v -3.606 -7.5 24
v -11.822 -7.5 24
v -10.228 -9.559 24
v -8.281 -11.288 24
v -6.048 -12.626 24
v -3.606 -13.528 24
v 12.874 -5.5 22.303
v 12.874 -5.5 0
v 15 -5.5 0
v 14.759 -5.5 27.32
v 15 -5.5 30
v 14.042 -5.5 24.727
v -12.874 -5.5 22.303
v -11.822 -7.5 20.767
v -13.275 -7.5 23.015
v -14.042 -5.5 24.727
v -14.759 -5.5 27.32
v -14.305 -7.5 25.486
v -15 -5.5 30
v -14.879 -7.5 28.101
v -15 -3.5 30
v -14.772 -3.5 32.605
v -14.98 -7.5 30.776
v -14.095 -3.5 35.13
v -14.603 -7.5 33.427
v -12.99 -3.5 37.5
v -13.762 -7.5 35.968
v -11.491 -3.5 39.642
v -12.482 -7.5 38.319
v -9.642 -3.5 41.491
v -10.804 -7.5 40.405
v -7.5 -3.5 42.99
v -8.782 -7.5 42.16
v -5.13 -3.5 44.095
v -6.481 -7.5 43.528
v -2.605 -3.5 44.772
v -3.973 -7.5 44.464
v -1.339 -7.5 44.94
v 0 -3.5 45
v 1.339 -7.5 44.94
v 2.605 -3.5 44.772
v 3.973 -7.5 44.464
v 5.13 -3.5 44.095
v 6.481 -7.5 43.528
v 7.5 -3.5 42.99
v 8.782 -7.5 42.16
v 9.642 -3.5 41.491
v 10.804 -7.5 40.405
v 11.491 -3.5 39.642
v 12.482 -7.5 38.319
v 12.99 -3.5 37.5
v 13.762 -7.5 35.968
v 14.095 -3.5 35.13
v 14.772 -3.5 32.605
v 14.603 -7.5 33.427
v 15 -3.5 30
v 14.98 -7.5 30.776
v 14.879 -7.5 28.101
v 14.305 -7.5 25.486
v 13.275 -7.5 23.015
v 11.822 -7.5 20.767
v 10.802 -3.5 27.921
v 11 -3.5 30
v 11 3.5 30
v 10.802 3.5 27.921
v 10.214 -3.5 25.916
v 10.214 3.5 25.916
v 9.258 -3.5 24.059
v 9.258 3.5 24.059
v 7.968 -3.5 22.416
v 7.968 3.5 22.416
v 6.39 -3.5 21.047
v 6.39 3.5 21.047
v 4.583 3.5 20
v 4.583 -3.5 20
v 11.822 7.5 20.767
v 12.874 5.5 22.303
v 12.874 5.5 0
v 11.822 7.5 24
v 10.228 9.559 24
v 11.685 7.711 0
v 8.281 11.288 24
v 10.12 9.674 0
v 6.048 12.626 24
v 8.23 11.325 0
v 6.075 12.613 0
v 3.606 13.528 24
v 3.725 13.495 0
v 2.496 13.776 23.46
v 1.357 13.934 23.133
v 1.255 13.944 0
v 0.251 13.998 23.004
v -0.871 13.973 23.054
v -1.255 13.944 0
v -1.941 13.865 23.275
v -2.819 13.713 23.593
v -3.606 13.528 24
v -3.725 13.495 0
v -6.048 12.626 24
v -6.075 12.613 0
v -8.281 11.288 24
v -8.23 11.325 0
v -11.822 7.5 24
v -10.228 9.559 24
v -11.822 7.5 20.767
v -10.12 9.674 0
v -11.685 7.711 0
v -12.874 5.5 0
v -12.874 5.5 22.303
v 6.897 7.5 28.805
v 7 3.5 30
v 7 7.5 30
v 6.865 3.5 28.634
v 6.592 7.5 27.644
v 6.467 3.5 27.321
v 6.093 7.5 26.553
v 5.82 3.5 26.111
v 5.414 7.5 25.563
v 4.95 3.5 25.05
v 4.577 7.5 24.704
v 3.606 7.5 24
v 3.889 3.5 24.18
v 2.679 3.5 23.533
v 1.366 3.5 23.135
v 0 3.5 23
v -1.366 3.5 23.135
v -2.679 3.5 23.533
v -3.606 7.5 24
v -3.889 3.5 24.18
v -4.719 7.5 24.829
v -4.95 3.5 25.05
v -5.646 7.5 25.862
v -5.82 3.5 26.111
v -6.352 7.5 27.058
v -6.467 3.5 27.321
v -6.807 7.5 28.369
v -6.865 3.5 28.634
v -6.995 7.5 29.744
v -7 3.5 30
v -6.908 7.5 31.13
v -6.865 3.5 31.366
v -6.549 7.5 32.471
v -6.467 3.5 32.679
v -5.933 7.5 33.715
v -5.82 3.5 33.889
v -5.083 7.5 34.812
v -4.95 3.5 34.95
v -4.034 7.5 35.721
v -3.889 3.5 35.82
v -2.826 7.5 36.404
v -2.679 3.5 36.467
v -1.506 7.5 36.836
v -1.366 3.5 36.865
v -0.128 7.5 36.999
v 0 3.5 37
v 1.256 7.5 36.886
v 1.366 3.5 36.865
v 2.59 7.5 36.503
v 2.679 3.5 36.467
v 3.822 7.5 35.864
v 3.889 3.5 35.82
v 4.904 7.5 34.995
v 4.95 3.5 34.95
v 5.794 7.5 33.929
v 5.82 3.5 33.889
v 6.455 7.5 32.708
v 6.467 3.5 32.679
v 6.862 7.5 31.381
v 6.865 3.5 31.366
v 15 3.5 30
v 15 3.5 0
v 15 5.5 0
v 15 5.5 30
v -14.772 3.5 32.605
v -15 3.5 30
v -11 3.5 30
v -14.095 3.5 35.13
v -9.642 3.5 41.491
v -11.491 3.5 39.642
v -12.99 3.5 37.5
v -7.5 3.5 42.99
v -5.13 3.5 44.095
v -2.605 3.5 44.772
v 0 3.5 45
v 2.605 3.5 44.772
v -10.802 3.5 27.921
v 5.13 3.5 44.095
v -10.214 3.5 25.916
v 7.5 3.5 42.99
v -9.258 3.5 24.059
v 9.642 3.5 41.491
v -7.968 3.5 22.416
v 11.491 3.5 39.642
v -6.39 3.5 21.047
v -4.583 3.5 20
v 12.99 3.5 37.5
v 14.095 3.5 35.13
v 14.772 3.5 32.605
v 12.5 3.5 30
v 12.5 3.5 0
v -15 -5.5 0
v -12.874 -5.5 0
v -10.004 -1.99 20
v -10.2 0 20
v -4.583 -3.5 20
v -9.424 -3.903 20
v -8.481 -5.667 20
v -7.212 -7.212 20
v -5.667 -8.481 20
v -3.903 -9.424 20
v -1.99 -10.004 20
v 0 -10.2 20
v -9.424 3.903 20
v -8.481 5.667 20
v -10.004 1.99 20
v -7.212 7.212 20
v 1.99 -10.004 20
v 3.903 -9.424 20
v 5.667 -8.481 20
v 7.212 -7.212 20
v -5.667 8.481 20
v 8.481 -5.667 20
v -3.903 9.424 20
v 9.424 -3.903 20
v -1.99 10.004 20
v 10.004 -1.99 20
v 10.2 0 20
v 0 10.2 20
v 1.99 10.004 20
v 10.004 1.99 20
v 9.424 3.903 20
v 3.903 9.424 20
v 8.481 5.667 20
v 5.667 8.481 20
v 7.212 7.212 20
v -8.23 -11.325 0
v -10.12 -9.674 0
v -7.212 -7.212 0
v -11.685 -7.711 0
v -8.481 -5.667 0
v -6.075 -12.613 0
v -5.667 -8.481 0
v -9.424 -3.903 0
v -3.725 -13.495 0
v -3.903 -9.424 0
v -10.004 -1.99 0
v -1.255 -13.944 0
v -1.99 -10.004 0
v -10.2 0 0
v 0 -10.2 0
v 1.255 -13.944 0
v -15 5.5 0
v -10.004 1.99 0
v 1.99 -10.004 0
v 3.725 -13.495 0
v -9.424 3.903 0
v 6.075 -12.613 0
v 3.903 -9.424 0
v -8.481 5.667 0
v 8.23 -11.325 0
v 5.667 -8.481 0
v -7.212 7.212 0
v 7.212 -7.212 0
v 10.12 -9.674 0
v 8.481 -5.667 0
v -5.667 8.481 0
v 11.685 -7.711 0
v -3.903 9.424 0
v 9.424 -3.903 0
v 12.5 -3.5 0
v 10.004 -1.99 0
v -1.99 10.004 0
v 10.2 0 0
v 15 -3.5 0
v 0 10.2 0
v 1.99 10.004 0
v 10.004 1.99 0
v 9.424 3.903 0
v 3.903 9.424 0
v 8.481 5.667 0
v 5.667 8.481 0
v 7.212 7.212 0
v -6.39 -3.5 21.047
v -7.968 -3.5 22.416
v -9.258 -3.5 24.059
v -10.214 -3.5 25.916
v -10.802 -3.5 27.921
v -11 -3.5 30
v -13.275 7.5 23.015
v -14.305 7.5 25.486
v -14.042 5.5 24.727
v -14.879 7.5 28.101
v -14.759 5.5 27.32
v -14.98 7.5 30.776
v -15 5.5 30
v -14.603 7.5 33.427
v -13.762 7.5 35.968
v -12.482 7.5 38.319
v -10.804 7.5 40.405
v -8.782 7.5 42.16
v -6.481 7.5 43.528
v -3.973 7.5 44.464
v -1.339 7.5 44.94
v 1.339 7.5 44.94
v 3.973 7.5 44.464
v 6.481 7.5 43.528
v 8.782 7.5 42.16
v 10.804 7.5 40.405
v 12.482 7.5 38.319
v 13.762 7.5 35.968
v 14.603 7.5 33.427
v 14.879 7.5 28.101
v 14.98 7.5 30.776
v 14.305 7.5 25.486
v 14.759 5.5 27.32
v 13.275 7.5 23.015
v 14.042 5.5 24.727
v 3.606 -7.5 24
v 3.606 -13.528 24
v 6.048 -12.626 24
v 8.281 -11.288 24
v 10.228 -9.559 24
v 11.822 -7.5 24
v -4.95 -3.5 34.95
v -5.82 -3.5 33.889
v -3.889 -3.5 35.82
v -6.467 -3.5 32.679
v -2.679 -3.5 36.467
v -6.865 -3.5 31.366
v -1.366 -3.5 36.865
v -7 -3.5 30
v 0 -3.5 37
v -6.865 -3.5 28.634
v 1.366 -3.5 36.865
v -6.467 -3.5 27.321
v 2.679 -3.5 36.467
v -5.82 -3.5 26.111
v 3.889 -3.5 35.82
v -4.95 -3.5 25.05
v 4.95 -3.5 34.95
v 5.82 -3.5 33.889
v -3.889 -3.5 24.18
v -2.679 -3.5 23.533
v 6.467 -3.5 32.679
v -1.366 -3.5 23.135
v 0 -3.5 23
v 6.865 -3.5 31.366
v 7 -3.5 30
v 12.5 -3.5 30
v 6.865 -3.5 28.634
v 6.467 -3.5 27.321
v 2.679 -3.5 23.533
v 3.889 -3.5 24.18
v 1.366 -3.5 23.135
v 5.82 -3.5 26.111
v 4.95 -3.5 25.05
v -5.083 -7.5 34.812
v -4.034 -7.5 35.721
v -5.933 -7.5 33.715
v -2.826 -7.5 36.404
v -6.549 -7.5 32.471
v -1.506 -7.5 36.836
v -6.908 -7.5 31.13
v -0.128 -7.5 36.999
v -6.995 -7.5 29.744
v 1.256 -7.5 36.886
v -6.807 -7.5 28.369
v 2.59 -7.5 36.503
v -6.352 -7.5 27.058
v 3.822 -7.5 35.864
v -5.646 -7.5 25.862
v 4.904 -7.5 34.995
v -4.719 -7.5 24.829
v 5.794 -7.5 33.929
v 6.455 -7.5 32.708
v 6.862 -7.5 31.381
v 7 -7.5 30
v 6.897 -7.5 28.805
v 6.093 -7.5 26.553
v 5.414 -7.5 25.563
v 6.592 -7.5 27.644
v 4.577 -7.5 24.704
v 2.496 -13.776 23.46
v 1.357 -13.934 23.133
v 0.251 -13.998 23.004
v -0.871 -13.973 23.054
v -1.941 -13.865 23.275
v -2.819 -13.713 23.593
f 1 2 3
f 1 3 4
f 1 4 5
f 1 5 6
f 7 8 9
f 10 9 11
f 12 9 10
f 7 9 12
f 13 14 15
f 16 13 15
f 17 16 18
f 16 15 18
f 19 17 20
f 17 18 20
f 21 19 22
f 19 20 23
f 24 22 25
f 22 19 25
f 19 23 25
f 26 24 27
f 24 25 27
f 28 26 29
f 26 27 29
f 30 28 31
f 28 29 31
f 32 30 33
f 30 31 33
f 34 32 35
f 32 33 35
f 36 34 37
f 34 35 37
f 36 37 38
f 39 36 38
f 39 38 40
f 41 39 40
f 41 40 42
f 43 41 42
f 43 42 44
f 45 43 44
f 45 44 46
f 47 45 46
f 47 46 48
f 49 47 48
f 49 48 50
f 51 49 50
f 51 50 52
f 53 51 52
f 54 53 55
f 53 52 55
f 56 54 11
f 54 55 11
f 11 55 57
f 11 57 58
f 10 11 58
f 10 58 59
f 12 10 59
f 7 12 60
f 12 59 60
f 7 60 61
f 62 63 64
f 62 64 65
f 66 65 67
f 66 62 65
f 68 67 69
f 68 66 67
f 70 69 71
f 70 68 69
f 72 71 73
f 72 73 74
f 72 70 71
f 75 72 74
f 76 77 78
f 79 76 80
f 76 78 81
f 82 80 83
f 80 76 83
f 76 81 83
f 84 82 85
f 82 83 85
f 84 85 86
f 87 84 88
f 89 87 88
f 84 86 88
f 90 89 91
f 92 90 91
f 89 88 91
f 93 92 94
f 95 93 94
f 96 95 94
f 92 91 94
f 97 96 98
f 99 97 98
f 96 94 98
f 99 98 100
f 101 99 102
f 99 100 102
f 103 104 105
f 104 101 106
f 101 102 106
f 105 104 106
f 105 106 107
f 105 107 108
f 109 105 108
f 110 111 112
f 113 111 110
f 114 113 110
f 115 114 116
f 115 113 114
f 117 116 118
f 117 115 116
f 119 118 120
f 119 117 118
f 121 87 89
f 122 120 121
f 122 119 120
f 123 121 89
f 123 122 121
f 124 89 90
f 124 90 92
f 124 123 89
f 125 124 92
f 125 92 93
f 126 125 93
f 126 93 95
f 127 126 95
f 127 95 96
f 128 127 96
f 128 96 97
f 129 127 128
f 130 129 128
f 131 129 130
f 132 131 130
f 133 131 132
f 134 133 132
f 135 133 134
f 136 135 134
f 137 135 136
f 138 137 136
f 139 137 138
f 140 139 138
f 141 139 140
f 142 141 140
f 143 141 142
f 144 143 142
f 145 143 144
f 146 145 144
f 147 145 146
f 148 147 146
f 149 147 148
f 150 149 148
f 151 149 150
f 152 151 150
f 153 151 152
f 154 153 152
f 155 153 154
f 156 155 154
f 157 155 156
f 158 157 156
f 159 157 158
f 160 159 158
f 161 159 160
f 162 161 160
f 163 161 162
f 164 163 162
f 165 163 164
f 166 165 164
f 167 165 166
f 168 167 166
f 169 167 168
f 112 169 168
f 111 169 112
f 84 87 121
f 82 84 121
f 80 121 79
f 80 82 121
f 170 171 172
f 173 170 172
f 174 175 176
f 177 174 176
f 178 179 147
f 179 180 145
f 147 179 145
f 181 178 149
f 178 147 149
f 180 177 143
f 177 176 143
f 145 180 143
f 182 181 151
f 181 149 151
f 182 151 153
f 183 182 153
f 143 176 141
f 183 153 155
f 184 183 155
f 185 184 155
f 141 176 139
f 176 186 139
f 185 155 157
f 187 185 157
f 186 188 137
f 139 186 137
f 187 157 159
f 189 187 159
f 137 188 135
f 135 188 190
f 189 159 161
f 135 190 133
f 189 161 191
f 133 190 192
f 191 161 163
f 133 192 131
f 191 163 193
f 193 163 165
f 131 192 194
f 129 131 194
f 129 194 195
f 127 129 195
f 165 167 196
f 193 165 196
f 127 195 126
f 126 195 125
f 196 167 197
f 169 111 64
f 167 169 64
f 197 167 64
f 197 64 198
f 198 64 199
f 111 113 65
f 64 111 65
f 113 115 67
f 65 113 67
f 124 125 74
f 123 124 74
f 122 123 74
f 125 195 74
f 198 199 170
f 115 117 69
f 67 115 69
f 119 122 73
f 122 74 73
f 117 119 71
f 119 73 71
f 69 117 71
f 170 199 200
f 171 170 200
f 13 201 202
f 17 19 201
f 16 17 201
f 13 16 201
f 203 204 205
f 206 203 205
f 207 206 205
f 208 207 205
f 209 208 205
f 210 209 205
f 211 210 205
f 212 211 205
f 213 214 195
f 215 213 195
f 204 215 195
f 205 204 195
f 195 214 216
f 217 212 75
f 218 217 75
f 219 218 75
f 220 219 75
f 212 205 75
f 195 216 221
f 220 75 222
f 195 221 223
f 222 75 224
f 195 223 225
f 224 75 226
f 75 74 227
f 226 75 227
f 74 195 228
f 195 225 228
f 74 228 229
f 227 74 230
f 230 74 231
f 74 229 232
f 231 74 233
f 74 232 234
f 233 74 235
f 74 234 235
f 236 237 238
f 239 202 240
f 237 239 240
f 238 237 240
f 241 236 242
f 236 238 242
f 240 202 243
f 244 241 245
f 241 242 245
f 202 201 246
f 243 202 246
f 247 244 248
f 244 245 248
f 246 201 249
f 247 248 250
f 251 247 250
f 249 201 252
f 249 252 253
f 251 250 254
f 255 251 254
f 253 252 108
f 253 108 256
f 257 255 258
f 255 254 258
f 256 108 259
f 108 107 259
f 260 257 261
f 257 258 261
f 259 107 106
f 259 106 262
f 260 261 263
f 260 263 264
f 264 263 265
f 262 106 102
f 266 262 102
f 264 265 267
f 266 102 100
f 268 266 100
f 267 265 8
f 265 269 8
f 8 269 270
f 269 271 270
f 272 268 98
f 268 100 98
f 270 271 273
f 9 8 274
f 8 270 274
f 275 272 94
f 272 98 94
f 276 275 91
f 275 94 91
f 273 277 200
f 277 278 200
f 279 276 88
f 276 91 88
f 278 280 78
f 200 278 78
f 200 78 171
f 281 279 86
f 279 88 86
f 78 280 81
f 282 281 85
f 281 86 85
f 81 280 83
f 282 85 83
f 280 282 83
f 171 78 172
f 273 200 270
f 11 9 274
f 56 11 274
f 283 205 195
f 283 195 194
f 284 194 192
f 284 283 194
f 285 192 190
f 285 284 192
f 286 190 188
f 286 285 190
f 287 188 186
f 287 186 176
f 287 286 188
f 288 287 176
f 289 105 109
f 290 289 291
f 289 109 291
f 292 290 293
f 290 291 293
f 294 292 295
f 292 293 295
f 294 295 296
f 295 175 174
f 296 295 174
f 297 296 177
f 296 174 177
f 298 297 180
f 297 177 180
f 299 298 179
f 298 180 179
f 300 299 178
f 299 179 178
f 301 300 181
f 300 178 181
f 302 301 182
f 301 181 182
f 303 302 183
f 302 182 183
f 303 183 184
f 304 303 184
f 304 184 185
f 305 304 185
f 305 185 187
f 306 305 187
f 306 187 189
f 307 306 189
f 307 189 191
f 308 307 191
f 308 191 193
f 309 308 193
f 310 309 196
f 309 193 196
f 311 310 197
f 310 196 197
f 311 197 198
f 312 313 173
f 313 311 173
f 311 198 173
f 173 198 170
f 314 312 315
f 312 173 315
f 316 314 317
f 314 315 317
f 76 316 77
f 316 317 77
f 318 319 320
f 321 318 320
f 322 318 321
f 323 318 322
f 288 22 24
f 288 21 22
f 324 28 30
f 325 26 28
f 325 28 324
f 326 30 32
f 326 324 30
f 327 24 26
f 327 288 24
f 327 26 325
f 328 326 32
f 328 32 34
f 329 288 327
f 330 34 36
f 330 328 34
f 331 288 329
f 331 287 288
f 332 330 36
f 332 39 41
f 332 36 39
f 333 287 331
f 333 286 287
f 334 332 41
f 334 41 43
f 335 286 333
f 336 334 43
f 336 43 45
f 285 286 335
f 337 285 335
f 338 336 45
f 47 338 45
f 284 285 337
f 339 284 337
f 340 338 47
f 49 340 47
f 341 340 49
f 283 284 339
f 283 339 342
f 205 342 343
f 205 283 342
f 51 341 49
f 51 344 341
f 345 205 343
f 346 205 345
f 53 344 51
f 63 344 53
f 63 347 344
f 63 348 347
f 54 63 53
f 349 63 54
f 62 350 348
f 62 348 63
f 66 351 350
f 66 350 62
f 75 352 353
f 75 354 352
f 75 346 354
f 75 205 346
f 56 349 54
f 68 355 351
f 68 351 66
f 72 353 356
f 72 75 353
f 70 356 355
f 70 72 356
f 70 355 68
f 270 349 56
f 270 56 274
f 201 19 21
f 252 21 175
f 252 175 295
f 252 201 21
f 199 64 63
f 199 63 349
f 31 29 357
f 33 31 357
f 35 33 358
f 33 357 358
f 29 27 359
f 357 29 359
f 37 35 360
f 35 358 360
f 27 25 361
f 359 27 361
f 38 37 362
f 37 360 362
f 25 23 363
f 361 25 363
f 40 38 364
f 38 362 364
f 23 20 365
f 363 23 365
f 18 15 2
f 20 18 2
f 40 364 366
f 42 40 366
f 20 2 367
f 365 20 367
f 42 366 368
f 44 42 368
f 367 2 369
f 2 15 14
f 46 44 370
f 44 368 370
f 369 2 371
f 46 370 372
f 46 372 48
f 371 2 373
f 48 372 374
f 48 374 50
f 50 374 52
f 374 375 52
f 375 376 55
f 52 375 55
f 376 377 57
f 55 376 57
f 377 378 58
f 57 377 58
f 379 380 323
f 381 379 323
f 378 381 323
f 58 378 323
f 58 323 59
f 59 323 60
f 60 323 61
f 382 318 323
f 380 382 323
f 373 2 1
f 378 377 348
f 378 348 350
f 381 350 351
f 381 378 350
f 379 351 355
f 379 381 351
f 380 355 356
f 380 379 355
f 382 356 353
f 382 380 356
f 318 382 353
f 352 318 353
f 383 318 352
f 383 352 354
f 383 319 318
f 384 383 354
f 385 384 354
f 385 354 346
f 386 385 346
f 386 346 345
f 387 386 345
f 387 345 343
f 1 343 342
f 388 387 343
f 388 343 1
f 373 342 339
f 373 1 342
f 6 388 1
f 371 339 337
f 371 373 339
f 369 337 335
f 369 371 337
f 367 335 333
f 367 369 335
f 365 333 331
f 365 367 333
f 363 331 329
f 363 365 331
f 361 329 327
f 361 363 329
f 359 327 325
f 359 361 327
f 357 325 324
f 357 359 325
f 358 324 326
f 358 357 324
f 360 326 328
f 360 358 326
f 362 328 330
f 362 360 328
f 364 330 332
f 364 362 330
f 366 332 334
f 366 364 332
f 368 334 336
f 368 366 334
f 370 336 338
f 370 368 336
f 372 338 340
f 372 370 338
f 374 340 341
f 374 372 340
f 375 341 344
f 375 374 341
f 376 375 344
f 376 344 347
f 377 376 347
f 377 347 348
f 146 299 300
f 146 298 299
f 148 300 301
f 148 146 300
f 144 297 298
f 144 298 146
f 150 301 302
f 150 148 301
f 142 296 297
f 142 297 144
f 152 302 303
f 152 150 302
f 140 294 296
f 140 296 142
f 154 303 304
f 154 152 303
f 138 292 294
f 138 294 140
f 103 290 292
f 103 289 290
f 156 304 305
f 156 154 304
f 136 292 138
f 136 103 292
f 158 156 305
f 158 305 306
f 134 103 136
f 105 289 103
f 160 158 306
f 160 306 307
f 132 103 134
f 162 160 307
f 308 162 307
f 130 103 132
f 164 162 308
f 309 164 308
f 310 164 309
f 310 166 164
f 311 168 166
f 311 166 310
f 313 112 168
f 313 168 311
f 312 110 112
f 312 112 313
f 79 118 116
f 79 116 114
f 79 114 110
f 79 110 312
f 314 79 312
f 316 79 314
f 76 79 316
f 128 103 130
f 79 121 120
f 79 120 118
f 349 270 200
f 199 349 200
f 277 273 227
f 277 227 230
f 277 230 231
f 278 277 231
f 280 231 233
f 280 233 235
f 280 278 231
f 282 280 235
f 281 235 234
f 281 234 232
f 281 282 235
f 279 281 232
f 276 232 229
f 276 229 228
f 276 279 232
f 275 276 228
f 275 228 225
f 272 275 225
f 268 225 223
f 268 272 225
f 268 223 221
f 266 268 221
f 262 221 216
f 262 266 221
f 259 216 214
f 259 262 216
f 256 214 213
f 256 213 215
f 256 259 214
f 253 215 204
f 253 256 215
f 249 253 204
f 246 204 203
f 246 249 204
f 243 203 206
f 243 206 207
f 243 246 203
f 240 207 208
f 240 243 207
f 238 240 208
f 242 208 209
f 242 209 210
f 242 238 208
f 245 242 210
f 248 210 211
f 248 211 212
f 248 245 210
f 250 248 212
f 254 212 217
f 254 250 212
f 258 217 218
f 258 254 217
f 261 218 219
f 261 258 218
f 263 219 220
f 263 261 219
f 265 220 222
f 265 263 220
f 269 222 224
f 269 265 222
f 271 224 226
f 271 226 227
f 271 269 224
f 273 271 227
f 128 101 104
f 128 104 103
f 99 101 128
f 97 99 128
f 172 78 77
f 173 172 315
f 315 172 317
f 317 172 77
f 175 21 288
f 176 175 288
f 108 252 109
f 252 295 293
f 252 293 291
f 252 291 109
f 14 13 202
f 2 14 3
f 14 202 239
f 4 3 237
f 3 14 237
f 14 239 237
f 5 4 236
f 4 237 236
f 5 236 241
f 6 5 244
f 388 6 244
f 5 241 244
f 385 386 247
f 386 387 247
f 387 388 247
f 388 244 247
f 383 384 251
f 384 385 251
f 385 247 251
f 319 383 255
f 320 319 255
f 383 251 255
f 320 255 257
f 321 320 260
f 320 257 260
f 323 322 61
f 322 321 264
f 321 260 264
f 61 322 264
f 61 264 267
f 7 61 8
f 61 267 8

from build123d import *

# Parameters (mm, degrees)
CYLINDER002_R          = 11
CYLINDER002_DEPTH      = 7
CYLINDER002_ROLL_ANGLE = -90
BOX_W                  = 30
BOX_H                  = 7
BOX_DEPTH              = 15
BOX001_W               = 10
BOX001_H               = 7
BOX001_DEPTH           = 30
CYLINDER005_R          = 10.2
CYLINDER005_DEPTH      = 20
CYLINDER004_R          = 7
CYLINDER004_DEPTH      = 30
CYLINDER004_ROLL_ANGLE = -90
CYLINDER001_R          = 15
CYLINDER001_DEPTH      = 15
CYLINDER001_ROLL_ANGLE = -90
BOX002_W               = 30
BOX002_H               = 11
BOX002_DEPTH           = 30
CYLINDER_R             = 14
CYLINDER_DEPTH         = 24


with BuildPart() as cylinder002:
    # Cylinder002 → Cylinder002 (new body)
    with BuildSketch(Plane.XY):
        Circle(CYLINDER002_R)
    extrude(amount=CYLINDER002_DEPTH)


with BuildPart() as cylinder002_1:
    # Cylinder002 roll: moved
    add(cylinder002.part.rotate(Axis((0, 0, 0), (1, 0, 0)), CYLINDER002_ROLL_ANGLE))


with BuildPart() as cylinder002_2:
    # Cylinder002 placement: moved
    add(cylinder002_1.part.moved(Location((0, -3.5, 30))))


with BuildPart() as cube:
    # Box → Box (new body)
    with BuildSketch(Plane(origin=(-15, -3.5, 30), x_dir=(1, 0, 0), z_dir=(0, 0, 1))):
        with Locations((15, 3.5)):
            Rectangle(BOX_W, BOX_H)
    extrude(amount=BOX_DEPTH)


with BuildPart() as cube001:
    # Box001 → Box001 (new body)
    with BuildSketch(Plane(origin=(12.5, -3.5, 0), x_dir=(1, 0, 0), z_dir=(0, 0, 1))):
        with Locations((5, 3.5)):
            Rectangle(BOX001_W, BOX001_H)
    extrude(amount=BOX001_DEPTH)


with BuildPart() as cylinder005:
    # Cylinder005 → Cylinder005 (new body)
    with BuildSketch(Plane.XY):
        Circle(CYLINDER005_R)
    extrude(amount=CYLINDER005_DEPTH)


with BuildPart() as negative_fustion:
    # Cylinder004 → Cylinder004 (new body)
    with BuildSketch(Plane.XY):
        Circle(CYLINDER004_R)
    extrude(amount=CYLINDER004_DEPTH)


with BuildPart() as negative_fustion_1:
    # Cylinder004 roll: moved
    add(negative_fustion.part.rotate(Axis((0, 0, 0), (1, 0, 0)), CYLINDER004_ROLL_ANGLE))


with BuildPart() as negative_fustion_2:
    # Cylinder004 placement: moved
    add(negative_fustion_1.part.moved(Location((0, -15, 30))))

    # Fusion001: union Cylinder002, Cube, Cube001, Cylinder005
    add(cylinder002_2.part)
    add(cube.part)
    add(cube001.part)
    add(cylinder005.part)


with BuildPart() as cylinder001:
    # Cylinder001 → Cylinder001 (new body)
    with BuildSketch(Plane.XY):
        Circle(CYLINDER001_R)
    extrude(amount=CYLINDER001_DEPTH)


with BuildPart() as cylinder001_1:
    # Cylinder001 roll: moved
    add(cylinder001.part.rotate(Axis((0, 0, 0), (1, 0, 0)), CYLINDER001_ROLL_ANGLE))


with BuildPart() as cylinder001_2:
    # Cylinder001 placement: moved
    add(cylinder001_1.part.moved(Location((0, -7.5, 30))))


with BuildPart() as cube002:
    # Box002 → Box002 (new body)
    with BuildSketch(Plane(origin=(-15, -5.5, 0), x_dir=(1, 0, 0), z_dir=(0, 0, 1))):
        with Locations((15, 5.5)):
            Rectangle(BOX002_W, BOX002_H)
    extrude(amount=BOX002_DEPTH)


with BuildPart() as cut:
    # Cylinder → Cylinder (new body)
    with BuildSketch(Plane.XY):
        Circle(CYLINDER_R)
    extrude(amount=CYLINDER_DEPTH)

    # Fusion: union Cylinder001, Cube002
    add(cylinder001_2.part)
    add(cube002.part)

    # Cut: cut Negative Fustion
    add(negative_fustion_2.part, mode=Mode.SUBTRACT)


solid = cut.part
